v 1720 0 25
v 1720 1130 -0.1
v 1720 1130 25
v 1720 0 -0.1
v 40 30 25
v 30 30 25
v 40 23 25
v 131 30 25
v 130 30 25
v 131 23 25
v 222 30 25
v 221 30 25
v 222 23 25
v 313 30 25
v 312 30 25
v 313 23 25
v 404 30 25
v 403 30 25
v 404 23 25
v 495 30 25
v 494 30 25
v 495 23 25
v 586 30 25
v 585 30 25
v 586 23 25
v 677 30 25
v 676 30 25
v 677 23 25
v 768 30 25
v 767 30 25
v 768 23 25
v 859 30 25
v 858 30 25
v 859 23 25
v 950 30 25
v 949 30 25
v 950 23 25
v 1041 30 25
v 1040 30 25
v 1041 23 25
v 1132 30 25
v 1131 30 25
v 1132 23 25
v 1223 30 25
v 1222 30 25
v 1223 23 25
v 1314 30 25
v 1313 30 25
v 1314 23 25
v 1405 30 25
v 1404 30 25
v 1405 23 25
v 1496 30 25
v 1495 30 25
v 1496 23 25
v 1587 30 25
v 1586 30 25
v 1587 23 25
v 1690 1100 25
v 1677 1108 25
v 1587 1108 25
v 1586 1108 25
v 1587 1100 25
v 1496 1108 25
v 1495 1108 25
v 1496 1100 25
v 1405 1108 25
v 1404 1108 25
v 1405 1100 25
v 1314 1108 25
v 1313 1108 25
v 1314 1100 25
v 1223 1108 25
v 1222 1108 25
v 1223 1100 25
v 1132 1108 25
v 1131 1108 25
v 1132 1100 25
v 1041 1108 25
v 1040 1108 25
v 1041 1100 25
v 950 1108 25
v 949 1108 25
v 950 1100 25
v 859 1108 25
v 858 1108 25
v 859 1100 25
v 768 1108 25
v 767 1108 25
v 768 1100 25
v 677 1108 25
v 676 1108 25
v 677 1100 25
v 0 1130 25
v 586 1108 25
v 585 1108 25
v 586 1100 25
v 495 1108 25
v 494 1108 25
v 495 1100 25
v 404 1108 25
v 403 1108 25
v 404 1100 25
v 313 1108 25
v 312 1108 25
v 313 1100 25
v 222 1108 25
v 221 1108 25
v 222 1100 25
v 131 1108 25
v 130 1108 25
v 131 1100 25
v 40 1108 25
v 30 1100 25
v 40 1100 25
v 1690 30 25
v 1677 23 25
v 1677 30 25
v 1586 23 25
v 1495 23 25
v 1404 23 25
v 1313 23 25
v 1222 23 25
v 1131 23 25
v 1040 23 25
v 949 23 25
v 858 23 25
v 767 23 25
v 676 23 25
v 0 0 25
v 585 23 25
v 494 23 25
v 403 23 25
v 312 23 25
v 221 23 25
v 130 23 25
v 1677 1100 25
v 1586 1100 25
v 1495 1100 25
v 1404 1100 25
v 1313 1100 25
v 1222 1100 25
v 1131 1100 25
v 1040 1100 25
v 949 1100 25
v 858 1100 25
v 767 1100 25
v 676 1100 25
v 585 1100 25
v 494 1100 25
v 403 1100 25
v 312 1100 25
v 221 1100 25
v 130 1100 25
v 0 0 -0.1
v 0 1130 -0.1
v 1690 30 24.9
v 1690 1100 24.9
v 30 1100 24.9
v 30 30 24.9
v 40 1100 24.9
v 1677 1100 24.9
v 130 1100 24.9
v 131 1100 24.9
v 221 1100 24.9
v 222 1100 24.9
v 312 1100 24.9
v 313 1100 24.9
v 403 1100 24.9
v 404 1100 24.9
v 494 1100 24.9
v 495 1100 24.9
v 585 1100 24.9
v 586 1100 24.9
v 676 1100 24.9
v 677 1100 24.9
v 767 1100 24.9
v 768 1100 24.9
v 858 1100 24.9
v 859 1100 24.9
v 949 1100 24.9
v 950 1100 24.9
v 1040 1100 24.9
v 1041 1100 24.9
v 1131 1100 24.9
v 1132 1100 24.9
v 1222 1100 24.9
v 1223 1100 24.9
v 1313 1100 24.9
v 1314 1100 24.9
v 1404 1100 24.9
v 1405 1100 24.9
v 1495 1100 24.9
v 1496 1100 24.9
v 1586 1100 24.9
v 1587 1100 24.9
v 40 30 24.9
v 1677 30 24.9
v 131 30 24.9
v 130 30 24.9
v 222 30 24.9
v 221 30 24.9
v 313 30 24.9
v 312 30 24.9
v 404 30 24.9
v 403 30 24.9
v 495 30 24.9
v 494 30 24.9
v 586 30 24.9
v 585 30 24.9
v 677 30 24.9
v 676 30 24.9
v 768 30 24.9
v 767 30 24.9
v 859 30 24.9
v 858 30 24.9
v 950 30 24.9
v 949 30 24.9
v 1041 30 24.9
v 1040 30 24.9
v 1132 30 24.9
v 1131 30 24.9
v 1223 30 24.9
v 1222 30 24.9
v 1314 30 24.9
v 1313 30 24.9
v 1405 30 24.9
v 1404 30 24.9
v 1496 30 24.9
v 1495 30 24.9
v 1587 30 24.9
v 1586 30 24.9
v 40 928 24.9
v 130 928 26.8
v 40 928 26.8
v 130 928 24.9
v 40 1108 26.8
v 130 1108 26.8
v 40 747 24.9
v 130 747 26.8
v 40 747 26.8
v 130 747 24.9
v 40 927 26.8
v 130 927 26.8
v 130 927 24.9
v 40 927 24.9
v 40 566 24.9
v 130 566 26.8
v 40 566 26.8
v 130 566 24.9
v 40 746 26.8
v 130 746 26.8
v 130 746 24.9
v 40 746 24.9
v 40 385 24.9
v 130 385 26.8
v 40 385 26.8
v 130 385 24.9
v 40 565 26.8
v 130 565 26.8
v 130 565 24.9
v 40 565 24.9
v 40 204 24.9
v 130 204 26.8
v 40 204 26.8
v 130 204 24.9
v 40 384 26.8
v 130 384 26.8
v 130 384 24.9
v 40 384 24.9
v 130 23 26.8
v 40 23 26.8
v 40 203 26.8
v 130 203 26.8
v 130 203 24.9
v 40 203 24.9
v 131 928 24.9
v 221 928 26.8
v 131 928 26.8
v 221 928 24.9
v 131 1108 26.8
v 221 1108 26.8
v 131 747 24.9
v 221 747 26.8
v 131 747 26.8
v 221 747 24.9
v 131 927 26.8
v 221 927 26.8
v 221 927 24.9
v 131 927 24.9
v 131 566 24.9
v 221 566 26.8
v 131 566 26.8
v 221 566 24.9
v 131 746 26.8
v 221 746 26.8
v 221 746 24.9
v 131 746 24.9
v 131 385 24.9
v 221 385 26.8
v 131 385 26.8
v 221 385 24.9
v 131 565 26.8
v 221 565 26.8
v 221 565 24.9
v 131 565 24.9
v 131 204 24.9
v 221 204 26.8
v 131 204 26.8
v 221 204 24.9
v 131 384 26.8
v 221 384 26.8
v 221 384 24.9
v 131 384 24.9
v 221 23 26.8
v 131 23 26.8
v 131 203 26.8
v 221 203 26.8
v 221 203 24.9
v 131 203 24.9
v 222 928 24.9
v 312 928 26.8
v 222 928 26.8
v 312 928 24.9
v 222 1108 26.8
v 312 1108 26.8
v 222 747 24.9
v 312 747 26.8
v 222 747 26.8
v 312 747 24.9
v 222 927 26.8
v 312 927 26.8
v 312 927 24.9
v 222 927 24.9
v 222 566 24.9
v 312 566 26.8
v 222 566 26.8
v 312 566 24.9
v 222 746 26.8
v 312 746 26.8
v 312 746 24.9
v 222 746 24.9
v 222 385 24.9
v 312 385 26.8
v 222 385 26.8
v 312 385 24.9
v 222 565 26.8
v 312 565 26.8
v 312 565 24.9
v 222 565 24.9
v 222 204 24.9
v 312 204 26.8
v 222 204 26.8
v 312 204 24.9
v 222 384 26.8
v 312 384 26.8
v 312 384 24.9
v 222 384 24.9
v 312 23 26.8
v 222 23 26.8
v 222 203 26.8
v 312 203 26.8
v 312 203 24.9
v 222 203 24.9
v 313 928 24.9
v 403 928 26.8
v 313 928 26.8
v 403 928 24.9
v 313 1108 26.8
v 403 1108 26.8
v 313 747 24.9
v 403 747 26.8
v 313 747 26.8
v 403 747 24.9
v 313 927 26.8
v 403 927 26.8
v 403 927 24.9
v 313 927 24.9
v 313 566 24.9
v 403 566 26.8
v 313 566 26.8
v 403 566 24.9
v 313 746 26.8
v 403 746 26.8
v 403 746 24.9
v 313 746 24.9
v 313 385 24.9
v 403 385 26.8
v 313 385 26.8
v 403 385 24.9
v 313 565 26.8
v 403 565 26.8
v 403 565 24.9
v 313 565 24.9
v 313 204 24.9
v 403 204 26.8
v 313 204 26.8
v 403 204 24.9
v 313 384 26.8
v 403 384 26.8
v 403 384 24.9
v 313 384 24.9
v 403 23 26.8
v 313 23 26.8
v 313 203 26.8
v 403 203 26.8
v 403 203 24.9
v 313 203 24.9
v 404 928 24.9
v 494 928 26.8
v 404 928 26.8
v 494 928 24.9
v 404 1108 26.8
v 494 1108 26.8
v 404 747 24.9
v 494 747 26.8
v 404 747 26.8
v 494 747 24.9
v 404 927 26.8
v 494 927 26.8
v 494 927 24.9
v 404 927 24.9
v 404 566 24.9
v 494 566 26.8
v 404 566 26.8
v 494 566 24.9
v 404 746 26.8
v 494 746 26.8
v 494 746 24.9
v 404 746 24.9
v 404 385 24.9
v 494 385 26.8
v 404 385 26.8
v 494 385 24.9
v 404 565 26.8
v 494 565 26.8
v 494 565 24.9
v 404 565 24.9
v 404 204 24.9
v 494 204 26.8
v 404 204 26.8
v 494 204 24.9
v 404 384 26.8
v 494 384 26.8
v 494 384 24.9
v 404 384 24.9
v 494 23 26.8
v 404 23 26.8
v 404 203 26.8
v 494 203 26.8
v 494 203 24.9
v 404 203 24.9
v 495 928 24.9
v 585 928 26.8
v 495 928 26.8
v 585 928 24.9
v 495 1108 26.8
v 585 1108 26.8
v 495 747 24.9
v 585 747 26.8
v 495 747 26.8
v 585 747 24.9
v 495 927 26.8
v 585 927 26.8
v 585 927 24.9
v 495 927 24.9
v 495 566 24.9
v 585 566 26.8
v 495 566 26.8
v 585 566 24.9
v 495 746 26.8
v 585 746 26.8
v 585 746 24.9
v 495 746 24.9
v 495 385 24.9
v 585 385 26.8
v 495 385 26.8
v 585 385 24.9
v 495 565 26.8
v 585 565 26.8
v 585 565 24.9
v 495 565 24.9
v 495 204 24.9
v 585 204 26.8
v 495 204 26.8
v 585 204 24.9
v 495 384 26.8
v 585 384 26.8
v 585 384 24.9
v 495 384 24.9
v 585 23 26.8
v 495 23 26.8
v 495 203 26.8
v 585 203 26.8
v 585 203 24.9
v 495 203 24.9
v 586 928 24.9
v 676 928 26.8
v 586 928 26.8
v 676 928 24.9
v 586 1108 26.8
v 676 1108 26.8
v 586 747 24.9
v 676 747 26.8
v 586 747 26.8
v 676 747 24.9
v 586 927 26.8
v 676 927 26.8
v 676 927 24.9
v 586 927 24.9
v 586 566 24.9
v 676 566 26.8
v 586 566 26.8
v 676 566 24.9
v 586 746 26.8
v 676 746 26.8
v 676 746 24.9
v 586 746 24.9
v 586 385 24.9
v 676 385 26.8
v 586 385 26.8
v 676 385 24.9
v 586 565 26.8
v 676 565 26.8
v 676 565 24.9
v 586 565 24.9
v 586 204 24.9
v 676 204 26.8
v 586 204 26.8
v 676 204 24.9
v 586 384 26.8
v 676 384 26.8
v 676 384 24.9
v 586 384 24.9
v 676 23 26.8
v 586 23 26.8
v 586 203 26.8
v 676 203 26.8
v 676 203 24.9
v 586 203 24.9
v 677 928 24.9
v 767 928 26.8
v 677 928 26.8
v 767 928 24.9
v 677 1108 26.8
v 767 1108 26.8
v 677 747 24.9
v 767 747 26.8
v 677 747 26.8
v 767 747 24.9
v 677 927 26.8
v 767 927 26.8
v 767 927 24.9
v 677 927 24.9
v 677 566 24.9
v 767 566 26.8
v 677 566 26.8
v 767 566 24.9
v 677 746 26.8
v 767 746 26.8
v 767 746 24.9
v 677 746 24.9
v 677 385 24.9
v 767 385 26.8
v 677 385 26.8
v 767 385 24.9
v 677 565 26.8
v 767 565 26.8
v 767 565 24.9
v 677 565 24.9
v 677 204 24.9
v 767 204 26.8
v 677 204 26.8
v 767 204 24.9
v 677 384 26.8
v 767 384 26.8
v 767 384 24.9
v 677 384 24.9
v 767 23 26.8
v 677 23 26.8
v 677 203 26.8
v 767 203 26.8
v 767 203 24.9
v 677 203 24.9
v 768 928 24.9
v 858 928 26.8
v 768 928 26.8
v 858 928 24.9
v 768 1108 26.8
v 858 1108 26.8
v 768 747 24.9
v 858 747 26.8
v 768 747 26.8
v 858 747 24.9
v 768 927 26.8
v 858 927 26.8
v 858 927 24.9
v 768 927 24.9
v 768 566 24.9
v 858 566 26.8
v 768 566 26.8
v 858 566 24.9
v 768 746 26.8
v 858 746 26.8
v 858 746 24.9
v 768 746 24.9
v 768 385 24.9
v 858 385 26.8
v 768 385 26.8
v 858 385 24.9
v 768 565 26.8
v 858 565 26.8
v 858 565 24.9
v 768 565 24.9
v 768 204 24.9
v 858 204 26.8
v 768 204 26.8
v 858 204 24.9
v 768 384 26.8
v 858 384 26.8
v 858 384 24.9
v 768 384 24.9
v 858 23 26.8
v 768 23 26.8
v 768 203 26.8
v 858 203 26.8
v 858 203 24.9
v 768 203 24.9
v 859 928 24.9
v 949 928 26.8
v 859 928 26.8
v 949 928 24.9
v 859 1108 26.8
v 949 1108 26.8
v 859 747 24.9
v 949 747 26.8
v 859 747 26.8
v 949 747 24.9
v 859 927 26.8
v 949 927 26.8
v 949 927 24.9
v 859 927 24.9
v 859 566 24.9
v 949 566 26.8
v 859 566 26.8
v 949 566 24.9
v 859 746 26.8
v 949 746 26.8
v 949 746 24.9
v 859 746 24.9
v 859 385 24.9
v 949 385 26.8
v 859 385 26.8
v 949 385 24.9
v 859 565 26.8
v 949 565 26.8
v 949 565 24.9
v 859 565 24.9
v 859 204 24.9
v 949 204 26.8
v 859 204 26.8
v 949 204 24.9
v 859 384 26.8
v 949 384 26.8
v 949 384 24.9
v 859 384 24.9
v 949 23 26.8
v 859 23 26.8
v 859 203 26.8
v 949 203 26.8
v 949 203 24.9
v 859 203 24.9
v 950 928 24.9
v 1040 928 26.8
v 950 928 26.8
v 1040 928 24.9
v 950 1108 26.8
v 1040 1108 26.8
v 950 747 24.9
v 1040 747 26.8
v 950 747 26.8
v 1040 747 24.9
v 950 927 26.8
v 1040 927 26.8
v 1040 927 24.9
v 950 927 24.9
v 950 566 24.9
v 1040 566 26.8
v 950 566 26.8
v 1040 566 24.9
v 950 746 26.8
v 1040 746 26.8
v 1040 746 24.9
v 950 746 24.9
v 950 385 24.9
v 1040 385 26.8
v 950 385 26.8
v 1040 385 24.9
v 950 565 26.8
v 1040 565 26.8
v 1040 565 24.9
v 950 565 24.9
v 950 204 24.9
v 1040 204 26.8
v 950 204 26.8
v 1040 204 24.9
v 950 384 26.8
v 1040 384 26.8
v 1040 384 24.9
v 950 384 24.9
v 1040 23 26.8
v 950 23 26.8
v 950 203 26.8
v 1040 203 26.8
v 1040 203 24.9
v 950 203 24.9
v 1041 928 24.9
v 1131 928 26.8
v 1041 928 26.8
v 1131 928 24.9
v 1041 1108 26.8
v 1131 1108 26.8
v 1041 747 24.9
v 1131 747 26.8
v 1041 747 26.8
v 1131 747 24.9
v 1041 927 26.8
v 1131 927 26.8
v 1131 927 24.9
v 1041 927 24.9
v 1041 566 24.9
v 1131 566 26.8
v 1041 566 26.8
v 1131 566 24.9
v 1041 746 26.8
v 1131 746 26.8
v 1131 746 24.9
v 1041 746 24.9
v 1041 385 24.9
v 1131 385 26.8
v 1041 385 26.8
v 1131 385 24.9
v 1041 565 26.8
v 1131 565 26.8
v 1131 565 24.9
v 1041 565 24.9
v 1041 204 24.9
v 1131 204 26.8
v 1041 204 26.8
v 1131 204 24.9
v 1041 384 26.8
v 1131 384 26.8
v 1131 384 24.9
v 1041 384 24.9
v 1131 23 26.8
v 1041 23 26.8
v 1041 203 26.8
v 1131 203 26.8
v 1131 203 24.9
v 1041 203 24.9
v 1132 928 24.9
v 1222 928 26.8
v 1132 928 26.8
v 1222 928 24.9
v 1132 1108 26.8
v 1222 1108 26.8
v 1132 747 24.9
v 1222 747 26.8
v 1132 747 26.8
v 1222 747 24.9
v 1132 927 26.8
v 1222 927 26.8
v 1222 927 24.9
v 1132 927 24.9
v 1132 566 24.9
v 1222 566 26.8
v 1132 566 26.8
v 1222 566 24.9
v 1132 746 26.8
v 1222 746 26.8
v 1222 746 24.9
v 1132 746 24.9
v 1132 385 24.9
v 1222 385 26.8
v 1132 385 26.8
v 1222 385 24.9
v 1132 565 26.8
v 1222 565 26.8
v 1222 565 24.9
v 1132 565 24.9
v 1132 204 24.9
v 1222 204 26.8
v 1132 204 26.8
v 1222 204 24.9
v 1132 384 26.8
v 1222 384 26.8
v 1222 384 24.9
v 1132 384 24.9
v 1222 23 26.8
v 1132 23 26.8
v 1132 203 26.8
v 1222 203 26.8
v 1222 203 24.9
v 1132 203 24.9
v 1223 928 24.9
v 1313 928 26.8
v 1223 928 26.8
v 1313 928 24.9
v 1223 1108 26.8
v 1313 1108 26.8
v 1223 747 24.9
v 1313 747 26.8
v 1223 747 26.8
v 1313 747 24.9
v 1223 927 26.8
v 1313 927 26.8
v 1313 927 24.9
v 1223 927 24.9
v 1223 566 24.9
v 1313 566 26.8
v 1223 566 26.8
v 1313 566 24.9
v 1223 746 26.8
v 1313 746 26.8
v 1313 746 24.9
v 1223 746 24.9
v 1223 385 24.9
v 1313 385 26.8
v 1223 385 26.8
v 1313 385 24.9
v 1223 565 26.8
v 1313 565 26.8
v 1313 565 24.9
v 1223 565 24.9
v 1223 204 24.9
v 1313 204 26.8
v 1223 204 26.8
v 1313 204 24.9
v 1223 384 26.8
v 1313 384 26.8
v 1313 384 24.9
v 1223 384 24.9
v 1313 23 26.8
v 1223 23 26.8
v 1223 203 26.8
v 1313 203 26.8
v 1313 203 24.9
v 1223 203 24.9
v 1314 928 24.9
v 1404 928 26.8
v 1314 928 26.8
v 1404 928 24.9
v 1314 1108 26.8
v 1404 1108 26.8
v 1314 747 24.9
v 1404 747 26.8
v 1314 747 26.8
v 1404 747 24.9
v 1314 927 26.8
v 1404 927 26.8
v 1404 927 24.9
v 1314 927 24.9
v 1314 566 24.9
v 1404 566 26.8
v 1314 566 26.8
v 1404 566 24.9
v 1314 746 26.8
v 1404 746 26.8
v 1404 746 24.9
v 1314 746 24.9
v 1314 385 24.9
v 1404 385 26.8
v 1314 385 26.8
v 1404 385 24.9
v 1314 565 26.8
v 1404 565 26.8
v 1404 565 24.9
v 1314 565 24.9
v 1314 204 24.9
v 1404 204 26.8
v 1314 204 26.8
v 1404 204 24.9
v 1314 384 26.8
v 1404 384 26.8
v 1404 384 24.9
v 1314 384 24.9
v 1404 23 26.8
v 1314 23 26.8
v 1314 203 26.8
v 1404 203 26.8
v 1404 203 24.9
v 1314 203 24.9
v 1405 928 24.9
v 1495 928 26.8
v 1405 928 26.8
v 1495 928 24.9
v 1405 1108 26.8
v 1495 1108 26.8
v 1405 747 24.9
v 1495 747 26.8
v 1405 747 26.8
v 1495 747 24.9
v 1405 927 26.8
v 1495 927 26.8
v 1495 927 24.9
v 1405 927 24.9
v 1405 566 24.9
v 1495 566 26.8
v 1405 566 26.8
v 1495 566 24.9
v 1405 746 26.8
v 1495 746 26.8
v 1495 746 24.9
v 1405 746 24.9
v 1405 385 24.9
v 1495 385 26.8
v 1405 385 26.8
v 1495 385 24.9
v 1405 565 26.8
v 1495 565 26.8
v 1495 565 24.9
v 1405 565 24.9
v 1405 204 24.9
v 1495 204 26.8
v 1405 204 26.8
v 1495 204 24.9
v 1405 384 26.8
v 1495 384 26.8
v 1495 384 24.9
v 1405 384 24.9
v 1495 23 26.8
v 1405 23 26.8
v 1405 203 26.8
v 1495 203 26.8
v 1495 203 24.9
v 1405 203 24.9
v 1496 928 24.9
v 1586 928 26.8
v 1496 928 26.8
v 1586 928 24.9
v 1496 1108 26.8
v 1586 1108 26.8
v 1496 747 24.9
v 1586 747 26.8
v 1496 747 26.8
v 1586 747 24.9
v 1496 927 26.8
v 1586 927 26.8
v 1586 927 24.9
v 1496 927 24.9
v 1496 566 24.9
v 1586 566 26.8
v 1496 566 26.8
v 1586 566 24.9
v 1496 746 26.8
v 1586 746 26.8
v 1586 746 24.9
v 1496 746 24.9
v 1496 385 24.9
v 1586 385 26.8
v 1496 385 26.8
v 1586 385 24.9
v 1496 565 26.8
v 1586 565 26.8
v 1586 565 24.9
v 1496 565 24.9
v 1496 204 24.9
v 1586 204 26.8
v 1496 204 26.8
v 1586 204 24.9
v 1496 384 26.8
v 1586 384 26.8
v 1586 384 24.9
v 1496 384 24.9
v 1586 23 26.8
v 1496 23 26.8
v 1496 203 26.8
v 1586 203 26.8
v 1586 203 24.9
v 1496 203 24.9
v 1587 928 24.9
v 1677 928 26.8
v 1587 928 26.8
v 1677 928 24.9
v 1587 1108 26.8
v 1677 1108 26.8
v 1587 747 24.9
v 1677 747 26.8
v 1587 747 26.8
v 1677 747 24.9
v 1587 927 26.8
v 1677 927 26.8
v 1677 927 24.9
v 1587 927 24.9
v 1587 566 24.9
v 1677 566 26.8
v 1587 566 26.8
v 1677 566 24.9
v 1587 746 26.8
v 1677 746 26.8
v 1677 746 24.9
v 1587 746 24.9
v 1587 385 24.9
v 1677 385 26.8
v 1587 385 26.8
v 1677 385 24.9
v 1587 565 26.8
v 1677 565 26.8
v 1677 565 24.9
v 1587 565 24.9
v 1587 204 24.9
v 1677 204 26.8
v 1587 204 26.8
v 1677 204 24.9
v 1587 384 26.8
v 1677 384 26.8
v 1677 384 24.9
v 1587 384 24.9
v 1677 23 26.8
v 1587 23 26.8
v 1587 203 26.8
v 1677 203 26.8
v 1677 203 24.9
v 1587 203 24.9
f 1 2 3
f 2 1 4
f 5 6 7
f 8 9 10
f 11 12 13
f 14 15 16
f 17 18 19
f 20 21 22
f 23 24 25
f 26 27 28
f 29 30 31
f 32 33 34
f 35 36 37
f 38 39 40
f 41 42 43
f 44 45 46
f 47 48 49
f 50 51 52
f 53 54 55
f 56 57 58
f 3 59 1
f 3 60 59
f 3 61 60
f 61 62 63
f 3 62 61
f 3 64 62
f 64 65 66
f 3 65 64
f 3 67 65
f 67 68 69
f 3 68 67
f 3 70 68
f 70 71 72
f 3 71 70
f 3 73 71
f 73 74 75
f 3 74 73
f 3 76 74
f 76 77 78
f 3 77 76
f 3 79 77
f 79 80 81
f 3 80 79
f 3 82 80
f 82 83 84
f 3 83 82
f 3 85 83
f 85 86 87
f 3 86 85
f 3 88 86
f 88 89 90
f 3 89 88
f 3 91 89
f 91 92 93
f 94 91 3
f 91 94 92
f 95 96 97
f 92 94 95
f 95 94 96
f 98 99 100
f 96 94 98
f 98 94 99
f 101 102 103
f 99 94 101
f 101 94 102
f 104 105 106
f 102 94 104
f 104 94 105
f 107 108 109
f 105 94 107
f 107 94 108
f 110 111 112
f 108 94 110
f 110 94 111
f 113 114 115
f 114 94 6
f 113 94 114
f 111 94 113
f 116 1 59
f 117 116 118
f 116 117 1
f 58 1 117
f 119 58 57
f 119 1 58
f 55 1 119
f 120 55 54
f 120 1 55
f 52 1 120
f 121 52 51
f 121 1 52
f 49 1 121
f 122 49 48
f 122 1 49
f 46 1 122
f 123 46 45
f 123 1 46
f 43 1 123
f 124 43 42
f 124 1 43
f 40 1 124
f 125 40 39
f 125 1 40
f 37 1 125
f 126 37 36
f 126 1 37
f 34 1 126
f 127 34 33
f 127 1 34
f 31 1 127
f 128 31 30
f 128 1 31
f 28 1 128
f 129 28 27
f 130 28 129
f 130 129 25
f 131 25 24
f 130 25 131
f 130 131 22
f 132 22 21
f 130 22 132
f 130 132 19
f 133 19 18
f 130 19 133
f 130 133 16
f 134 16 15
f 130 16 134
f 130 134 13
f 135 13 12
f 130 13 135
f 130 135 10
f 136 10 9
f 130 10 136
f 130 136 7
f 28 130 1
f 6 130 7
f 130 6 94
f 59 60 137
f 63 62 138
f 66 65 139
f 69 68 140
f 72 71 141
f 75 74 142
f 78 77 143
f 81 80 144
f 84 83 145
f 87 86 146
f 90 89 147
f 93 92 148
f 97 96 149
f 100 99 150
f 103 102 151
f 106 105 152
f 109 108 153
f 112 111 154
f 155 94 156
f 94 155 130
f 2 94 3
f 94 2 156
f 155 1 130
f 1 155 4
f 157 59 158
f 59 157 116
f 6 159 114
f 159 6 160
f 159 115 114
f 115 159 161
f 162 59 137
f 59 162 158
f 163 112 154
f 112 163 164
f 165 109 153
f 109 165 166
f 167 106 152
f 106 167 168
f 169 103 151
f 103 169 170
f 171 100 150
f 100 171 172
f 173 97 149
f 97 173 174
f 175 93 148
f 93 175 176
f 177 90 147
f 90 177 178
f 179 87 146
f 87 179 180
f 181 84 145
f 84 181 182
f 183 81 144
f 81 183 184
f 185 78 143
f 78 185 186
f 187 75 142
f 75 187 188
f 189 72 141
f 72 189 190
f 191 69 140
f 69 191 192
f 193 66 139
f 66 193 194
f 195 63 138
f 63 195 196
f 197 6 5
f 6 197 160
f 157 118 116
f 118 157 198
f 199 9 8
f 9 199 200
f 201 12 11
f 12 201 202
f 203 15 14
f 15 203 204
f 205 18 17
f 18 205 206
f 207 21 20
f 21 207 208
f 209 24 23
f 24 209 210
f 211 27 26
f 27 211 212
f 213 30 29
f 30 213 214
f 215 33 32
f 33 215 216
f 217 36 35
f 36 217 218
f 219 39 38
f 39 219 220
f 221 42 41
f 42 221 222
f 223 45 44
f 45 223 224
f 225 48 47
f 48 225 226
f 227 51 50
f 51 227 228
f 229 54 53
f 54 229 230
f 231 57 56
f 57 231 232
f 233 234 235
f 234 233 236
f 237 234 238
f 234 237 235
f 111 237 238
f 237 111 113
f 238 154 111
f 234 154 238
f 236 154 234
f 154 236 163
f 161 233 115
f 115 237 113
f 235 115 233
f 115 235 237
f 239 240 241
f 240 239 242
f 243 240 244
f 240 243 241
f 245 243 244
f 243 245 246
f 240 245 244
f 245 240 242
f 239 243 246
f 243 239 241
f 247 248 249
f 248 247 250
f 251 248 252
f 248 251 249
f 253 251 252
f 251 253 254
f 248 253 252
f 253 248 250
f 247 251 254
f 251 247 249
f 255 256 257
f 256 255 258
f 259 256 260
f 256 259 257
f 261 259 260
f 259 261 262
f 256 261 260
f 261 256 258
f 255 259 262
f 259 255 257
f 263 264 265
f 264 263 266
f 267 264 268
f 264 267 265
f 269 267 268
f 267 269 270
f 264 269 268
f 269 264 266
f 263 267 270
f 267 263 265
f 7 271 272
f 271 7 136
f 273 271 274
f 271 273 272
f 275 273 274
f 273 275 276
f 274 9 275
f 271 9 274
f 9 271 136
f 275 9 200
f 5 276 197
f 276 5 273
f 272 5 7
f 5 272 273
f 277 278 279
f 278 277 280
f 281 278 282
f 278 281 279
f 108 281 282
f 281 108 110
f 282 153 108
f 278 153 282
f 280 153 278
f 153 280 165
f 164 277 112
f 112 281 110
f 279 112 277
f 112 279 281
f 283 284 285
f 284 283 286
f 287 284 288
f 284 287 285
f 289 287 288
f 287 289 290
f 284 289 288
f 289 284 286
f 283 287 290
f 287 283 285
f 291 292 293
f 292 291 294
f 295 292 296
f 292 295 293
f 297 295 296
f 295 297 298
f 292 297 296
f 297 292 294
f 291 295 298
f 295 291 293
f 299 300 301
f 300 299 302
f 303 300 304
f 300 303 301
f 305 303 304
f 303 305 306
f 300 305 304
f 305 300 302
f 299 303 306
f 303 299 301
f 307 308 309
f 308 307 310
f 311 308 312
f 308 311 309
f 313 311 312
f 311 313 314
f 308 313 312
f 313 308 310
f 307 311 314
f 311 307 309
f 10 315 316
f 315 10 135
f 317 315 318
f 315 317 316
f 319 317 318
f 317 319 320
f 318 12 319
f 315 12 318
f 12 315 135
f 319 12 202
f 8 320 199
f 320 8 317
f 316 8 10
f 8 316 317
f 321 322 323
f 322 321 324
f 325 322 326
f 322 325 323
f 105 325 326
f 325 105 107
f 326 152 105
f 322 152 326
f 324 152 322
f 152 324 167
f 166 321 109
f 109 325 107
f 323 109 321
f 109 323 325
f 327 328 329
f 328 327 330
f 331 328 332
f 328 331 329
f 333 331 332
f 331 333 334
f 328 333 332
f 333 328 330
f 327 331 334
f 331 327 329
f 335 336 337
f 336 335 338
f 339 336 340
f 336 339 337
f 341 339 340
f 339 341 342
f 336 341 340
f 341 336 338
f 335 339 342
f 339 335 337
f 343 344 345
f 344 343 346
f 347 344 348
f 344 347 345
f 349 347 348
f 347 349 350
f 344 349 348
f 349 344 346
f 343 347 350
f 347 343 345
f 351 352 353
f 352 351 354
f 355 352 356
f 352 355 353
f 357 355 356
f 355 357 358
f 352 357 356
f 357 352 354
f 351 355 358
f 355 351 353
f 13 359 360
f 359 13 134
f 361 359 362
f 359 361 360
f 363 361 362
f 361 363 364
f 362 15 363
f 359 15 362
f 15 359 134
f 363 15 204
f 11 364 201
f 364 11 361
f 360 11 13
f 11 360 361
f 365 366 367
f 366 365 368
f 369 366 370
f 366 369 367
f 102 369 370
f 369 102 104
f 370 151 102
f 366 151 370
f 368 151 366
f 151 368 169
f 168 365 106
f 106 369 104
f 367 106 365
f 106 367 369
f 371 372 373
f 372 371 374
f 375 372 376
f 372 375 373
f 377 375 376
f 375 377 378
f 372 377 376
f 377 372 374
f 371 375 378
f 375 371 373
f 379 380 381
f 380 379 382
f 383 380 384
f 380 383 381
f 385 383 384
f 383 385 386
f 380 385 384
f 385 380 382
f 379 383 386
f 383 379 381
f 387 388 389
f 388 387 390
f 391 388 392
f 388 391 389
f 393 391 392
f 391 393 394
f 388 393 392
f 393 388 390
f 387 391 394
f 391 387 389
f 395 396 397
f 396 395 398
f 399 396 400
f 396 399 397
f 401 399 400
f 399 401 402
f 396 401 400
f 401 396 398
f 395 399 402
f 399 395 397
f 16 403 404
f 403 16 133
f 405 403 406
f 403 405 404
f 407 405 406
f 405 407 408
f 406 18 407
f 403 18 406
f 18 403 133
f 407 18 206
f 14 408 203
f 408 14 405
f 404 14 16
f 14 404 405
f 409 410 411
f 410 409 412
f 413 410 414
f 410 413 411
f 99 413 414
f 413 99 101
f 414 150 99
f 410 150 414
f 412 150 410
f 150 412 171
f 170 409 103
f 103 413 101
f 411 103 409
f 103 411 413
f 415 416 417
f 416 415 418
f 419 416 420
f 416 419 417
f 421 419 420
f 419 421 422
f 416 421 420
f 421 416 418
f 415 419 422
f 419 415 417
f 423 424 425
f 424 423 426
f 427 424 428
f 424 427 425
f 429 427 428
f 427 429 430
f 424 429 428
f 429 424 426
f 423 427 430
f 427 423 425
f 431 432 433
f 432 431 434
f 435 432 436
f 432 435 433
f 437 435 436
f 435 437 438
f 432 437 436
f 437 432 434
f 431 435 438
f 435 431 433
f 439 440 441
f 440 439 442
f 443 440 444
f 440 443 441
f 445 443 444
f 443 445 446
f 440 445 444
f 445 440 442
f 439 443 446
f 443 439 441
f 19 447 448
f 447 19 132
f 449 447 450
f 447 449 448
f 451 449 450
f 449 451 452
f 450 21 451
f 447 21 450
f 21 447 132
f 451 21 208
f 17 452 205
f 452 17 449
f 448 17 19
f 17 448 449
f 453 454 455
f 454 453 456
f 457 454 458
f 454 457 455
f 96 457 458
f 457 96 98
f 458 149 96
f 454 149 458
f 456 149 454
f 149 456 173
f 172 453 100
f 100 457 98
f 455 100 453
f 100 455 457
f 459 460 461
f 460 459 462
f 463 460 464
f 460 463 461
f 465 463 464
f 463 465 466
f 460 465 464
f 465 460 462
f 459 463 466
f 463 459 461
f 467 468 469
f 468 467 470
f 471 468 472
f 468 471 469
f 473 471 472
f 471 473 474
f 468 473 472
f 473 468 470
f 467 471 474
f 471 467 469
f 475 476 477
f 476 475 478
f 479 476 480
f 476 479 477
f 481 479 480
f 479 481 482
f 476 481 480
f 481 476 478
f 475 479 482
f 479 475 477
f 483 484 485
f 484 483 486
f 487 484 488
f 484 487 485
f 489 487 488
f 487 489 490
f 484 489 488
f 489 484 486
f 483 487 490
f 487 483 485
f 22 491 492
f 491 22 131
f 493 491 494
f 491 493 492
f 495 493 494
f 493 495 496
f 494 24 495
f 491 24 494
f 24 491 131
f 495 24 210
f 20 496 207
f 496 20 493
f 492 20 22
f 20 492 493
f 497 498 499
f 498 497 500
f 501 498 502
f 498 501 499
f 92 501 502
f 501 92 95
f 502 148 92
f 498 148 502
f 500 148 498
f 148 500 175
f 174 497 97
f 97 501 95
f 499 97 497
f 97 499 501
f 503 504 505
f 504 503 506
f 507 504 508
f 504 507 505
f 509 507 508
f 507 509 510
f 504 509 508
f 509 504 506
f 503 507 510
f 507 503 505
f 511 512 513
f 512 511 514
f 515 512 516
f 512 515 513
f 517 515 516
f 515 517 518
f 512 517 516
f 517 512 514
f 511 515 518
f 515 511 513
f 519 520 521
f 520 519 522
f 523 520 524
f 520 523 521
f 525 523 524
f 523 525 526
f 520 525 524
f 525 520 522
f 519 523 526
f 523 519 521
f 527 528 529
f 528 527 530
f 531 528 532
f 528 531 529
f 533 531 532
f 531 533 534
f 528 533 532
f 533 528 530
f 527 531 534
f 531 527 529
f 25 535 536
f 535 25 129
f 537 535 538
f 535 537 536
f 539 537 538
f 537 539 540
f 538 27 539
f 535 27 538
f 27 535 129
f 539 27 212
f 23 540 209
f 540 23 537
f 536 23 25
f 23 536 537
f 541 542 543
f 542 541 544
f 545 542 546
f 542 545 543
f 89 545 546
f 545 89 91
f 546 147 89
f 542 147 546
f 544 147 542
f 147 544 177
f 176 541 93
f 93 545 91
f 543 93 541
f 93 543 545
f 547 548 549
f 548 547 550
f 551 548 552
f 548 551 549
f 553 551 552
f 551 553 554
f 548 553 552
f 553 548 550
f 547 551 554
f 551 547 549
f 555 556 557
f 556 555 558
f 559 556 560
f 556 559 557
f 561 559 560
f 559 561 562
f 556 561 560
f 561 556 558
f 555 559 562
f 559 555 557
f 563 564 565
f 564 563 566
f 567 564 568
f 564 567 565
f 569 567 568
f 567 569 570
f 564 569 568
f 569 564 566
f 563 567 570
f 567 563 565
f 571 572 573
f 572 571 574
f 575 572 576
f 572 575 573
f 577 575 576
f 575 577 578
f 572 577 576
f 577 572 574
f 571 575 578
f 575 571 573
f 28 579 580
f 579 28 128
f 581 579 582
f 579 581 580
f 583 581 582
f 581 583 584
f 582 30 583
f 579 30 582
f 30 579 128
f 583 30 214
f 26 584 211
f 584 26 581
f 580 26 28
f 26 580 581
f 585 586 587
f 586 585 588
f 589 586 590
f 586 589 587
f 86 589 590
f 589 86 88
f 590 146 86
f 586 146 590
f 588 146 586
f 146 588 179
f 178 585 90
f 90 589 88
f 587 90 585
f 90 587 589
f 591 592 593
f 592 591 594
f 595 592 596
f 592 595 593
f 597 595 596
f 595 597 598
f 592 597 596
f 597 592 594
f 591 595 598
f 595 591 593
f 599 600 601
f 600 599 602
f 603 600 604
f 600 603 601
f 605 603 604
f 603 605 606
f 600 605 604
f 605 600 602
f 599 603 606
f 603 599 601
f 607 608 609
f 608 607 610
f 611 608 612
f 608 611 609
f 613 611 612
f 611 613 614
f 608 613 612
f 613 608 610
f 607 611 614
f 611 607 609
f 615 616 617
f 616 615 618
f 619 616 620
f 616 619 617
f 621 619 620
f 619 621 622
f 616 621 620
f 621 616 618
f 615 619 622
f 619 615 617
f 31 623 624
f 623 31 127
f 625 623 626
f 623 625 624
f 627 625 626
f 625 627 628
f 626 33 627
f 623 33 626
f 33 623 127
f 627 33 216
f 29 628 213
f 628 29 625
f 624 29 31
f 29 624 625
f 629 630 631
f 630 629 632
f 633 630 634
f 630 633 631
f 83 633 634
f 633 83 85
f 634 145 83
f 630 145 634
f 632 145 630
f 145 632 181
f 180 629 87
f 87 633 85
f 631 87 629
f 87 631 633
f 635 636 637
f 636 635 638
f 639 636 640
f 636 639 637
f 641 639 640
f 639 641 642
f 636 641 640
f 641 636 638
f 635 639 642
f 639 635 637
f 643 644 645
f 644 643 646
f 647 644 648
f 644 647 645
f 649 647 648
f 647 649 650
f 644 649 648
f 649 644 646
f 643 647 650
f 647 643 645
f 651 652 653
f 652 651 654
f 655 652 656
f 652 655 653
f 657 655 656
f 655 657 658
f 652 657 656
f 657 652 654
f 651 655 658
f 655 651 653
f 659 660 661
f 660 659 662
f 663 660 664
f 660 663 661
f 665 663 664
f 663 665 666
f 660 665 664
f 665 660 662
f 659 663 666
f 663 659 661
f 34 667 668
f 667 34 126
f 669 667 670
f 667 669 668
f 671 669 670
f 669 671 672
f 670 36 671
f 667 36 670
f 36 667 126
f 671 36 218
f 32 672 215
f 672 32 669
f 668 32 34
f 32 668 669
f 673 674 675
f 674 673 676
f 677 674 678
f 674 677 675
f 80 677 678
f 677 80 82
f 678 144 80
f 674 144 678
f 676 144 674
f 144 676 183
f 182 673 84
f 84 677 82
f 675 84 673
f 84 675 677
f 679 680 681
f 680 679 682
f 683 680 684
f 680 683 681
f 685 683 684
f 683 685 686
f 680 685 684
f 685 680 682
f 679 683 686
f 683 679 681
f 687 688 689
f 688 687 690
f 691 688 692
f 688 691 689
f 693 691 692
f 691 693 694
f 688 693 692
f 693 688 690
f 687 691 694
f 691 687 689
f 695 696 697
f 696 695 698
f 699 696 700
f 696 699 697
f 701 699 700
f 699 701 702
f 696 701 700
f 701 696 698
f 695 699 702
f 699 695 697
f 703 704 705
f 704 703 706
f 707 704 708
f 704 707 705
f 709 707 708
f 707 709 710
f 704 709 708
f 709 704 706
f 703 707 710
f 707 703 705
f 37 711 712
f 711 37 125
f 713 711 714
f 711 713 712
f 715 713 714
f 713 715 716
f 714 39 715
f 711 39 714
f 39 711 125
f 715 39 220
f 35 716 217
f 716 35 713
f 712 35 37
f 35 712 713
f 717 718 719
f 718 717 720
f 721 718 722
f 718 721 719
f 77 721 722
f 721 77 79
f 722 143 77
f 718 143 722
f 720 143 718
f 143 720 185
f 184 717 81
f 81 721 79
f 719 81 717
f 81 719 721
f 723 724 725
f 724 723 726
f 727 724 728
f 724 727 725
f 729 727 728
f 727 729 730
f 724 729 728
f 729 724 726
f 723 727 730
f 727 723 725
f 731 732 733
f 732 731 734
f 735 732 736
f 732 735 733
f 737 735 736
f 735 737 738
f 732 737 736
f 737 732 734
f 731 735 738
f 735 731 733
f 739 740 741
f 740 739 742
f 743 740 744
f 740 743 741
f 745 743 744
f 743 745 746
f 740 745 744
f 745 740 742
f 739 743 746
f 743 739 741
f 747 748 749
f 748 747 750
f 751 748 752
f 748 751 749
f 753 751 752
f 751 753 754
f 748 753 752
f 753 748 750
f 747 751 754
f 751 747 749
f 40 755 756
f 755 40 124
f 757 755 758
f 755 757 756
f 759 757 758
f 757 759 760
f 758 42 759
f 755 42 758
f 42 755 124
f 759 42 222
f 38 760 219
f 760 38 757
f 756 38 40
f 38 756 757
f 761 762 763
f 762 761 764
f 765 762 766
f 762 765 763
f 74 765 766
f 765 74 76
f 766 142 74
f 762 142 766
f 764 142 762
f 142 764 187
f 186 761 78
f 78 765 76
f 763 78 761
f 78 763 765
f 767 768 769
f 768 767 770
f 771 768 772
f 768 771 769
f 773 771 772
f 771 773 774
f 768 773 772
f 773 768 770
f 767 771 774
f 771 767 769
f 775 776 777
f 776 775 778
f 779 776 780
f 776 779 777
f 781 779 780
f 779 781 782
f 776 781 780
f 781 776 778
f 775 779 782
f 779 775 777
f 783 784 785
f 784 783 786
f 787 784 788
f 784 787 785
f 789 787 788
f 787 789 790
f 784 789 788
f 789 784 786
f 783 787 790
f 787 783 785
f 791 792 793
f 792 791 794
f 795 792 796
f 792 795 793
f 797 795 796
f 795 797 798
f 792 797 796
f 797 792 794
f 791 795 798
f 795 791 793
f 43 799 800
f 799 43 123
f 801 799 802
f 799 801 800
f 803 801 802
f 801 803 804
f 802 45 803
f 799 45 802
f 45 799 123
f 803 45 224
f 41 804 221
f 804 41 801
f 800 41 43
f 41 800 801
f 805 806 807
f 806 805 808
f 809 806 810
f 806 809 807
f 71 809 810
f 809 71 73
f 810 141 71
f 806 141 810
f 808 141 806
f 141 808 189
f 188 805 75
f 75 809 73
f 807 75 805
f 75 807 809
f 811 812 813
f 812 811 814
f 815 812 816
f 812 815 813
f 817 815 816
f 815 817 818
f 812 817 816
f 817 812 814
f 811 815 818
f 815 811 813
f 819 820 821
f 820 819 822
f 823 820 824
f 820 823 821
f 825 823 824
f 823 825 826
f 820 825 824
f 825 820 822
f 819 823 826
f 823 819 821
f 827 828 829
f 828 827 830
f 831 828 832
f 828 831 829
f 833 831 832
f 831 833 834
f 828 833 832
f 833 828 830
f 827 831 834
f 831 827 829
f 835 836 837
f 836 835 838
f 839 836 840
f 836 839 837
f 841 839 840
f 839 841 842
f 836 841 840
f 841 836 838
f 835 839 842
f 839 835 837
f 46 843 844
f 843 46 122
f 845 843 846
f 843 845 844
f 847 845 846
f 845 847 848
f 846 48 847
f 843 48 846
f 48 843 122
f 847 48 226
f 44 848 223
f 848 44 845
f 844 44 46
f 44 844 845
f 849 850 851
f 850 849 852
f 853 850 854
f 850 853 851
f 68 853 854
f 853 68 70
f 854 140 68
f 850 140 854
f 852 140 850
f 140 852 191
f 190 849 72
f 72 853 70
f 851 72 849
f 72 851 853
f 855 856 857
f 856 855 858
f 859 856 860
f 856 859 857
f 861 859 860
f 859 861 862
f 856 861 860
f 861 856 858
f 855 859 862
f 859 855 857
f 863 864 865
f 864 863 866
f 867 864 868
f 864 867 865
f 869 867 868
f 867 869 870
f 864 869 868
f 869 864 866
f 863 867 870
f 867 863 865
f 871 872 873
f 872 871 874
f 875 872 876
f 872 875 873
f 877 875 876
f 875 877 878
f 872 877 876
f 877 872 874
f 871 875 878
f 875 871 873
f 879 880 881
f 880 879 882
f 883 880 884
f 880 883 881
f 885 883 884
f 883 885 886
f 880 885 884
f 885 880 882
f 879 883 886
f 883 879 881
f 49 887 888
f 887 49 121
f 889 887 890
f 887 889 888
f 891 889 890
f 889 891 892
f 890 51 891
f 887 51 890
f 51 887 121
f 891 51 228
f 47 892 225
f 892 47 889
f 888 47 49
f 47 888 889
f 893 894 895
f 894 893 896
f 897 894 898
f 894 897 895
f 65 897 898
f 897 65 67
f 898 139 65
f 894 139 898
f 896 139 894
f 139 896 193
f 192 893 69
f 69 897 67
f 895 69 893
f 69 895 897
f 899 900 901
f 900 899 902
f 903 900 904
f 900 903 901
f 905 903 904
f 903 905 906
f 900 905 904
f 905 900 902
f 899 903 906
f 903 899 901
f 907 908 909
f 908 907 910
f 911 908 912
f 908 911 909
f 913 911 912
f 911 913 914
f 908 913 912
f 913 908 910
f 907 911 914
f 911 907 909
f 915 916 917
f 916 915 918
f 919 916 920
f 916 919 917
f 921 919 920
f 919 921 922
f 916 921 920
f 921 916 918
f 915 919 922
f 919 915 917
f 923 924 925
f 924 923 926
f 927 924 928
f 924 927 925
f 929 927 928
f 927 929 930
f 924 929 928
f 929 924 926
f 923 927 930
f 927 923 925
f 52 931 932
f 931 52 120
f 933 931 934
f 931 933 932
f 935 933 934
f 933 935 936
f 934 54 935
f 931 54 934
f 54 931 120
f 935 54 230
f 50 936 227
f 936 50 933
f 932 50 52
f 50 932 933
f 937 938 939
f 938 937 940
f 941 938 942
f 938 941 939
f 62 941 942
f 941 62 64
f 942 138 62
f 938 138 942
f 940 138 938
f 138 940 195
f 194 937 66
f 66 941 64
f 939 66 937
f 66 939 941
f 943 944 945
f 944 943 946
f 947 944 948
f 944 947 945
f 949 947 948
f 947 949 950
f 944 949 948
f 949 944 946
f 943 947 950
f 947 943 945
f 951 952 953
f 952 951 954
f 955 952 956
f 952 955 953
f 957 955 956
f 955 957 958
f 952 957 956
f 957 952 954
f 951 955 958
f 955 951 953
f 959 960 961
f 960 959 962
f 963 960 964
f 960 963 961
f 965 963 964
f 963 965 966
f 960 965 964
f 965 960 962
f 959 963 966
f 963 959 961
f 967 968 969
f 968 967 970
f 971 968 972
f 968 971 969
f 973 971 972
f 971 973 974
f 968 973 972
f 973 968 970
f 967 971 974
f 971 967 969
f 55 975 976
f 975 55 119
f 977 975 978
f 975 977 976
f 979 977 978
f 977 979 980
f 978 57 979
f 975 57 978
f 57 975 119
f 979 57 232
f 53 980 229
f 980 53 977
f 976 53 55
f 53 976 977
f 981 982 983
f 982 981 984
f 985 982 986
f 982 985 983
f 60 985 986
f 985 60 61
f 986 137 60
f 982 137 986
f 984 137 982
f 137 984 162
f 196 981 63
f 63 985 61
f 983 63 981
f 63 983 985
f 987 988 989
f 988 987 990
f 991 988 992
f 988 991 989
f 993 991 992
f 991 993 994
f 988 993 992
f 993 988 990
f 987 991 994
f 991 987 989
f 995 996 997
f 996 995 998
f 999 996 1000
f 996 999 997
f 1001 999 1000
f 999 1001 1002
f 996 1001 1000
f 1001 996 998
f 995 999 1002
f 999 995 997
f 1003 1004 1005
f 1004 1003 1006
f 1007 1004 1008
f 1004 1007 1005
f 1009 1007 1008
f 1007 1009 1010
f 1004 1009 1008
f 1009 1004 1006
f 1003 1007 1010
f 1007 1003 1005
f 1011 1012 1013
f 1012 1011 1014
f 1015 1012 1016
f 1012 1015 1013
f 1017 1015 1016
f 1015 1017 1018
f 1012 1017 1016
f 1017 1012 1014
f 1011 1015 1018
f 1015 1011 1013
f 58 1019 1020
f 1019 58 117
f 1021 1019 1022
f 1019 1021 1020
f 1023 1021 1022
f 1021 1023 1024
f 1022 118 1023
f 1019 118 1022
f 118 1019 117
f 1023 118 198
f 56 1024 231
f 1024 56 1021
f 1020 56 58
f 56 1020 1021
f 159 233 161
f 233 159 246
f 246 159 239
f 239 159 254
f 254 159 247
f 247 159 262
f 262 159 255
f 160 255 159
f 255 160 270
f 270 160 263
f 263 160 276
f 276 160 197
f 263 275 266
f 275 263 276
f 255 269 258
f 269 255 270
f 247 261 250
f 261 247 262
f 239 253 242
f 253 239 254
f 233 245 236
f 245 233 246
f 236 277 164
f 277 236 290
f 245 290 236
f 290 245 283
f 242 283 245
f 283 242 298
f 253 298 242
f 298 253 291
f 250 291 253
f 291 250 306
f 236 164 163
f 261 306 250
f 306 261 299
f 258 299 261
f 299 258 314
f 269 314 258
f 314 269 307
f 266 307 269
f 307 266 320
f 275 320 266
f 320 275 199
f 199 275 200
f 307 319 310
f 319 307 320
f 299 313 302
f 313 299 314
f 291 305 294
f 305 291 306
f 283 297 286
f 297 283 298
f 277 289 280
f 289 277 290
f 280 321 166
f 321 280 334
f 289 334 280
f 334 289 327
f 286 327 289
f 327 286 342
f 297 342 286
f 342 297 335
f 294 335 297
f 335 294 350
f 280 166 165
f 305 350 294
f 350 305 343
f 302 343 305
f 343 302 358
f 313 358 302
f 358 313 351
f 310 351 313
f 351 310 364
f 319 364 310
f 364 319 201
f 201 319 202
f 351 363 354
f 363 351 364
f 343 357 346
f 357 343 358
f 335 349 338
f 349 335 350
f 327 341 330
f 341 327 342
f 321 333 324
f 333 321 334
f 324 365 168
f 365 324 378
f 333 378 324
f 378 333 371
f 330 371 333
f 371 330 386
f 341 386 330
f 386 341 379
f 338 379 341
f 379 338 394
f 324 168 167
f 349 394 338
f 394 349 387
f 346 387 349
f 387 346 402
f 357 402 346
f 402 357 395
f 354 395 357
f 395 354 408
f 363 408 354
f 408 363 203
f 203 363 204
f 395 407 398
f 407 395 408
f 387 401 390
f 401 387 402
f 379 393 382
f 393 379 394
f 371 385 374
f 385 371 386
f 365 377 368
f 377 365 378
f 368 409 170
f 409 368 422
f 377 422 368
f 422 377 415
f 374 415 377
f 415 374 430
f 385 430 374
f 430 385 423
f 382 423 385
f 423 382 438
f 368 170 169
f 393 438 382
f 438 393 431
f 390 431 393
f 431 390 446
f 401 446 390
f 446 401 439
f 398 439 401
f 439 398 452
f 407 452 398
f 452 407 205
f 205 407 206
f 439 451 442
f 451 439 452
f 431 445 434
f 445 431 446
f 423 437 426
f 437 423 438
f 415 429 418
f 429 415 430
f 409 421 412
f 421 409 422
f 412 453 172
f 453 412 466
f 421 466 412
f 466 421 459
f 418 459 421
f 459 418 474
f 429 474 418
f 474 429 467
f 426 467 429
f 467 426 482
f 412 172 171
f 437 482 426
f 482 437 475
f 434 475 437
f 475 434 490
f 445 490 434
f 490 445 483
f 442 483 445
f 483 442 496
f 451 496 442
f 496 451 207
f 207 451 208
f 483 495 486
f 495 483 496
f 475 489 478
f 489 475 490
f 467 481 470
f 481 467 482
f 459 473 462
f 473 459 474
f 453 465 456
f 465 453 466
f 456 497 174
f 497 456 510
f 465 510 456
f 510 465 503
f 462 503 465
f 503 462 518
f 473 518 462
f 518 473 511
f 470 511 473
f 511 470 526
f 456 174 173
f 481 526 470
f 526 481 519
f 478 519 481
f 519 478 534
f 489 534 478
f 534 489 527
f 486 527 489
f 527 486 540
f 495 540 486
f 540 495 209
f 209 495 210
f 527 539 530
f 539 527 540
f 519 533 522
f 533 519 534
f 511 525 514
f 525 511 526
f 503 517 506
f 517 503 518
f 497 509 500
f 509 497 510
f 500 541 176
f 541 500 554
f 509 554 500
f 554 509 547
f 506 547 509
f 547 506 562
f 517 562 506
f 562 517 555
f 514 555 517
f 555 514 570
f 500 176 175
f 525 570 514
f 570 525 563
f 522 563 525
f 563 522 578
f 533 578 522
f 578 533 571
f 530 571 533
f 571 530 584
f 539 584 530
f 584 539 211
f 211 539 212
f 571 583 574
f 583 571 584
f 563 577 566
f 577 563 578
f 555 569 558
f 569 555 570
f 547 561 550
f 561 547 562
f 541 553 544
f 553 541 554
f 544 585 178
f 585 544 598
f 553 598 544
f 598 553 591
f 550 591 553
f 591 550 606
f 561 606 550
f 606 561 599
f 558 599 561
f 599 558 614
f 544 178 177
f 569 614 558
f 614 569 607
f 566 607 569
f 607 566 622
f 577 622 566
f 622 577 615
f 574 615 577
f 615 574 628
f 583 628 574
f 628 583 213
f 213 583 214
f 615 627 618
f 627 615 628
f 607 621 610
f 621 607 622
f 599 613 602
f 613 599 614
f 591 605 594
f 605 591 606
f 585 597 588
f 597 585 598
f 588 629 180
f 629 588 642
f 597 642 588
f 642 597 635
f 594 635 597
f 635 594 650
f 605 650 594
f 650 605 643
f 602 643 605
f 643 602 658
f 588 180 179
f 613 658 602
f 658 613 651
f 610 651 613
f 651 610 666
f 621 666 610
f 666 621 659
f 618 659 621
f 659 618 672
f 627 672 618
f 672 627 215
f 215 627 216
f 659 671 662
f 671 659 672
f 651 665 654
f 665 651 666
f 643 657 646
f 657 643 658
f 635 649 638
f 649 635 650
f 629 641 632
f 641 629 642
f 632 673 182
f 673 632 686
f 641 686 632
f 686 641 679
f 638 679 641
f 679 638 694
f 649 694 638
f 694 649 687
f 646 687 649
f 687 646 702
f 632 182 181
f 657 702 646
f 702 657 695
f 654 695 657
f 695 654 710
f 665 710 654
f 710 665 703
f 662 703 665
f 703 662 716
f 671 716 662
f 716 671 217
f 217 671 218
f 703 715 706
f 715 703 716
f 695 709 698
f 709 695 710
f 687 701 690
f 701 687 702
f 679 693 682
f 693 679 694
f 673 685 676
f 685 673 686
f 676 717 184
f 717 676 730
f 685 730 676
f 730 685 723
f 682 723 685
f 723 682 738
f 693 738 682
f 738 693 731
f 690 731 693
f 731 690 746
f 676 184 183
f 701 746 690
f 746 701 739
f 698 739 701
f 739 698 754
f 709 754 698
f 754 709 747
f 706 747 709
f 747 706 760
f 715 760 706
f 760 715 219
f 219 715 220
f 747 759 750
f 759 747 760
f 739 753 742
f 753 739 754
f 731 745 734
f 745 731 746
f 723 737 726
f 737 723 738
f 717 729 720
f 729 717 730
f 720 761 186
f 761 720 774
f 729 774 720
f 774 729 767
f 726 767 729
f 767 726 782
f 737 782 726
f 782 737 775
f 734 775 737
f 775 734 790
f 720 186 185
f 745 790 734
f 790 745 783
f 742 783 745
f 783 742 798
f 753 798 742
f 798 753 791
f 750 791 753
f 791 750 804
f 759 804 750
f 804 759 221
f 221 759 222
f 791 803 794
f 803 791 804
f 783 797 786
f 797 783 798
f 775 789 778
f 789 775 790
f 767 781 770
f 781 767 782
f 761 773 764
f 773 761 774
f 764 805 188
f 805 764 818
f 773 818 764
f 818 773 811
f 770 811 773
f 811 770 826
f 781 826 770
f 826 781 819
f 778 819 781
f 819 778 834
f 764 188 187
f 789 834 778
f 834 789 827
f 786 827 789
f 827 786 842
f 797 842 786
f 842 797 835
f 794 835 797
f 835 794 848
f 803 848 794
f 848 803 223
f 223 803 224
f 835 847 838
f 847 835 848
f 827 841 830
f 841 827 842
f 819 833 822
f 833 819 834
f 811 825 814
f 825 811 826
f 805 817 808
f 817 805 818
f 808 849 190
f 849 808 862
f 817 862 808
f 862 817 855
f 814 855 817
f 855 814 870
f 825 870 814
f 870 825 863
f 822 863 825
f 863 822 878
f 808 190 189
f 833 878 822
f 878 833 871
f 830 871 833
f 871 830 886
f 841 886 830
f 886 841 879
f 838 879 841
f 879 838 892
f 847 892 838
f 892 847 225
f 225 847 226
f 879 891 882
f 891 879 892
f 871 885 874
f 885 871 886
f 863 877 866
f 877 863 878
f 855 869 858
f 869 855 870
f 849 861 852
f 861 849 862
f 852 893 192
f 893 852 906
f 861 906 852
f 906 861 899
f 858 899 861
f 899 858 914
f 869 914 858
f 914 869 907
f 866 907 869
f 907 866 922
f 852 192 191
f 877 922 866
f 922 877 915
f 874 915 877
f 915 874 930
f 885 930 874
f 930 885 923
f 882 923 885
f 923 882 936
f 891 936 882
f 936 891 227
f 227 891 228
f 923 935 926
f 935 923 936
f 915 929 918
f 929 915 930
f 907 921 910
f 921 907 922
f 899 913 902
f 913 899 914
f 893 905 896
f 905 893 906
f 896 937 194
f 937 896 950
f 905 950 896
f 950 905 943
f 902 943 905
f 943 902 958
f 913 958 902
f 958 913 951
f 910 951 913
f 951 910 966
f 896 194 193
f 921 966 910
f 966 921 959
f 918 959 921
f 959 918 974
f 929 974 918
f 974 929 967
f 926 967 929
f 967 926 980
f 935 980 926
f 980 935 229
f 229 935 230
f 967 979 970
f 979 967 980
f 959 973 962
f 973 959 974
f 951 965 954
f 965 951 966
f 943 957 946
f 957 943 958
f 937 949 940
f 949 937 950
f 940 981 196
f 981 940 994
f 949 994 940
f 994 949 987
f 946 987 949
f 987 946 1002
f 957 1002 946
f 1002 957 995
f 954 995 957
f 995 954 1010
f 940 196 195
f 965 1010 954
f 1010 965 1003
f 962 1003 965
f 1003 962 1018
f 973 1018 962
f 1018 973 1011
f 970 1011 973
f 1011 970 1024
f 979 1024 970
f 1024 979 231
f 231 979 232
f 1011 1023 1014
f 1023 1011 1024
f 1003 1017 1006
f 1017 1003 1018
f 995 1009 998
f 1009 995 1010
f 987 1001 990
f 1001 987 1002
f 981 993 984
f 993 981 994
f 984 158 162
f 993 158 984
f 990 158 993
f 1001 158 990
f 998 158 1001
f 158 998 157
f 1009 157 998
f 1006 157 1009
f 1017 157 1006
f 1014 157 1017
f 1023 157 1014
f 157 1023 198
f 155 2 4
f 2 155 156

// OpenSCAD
// PV-Modul mit 72 Half-Cut-Zellen und Alurahmen

// Modulabmessungen
modul_x = 1720;
modul_y = 1130;
modul_z = 25;
rahmen_dicke = 30; // Aluminiumrahmen-Dicke

// Zellengröße (halbierte Standardzelle, ca. 156 mm x 78 mm)
zelle_x = 180;
zelle_y = 90;
zelle_z = 02;
zellen_reihen = 18;  // 72 Half-Cut-Zellen => 24 Reihen x 6 Spalten
zellen_spalten = 6;
zellen_abstand = 1; // Abstand zwischen Zellen

module alurahmen() {
    difference() {
        cube([modul_x, modul_y, modul_z]);
        translate([rahmen_dicke, rahmen_dicke, 0-0.1])
            cube([modul_x - 2*rahmen_dicke, modul_y - 2*rahmen_dicke, modul_z+0.2]);
    }
}

module zelle() {
    color("blue") cube([zelle_x, zelle_y, zelle_z]);
}

module pv_zellen() {
    for (i = [0 : zellen_reihen - 1]) {
        for (j = [0 : zellen_spalten - 1]) {
            translate([
            j * (zelle_x + zellen_abstand) + zellen_abstand*22, 
            i * (zelle_y + zellen_abstand) + zellen_abstand*40, 
            modul_z - 0.2])
            zelle();
        }
    }
}

module pv_modul() {
    color("silver") alurahmen();
    color("white") translate([0,0,-.1]) cube([modul_x, modul_y, modul_z]);
    rotate([0,0,-90]) translate([-modul_y,0,0.0])  pv_zellen();
}

// Gesamtes PV-Modul anzeigen
pv_modul();
